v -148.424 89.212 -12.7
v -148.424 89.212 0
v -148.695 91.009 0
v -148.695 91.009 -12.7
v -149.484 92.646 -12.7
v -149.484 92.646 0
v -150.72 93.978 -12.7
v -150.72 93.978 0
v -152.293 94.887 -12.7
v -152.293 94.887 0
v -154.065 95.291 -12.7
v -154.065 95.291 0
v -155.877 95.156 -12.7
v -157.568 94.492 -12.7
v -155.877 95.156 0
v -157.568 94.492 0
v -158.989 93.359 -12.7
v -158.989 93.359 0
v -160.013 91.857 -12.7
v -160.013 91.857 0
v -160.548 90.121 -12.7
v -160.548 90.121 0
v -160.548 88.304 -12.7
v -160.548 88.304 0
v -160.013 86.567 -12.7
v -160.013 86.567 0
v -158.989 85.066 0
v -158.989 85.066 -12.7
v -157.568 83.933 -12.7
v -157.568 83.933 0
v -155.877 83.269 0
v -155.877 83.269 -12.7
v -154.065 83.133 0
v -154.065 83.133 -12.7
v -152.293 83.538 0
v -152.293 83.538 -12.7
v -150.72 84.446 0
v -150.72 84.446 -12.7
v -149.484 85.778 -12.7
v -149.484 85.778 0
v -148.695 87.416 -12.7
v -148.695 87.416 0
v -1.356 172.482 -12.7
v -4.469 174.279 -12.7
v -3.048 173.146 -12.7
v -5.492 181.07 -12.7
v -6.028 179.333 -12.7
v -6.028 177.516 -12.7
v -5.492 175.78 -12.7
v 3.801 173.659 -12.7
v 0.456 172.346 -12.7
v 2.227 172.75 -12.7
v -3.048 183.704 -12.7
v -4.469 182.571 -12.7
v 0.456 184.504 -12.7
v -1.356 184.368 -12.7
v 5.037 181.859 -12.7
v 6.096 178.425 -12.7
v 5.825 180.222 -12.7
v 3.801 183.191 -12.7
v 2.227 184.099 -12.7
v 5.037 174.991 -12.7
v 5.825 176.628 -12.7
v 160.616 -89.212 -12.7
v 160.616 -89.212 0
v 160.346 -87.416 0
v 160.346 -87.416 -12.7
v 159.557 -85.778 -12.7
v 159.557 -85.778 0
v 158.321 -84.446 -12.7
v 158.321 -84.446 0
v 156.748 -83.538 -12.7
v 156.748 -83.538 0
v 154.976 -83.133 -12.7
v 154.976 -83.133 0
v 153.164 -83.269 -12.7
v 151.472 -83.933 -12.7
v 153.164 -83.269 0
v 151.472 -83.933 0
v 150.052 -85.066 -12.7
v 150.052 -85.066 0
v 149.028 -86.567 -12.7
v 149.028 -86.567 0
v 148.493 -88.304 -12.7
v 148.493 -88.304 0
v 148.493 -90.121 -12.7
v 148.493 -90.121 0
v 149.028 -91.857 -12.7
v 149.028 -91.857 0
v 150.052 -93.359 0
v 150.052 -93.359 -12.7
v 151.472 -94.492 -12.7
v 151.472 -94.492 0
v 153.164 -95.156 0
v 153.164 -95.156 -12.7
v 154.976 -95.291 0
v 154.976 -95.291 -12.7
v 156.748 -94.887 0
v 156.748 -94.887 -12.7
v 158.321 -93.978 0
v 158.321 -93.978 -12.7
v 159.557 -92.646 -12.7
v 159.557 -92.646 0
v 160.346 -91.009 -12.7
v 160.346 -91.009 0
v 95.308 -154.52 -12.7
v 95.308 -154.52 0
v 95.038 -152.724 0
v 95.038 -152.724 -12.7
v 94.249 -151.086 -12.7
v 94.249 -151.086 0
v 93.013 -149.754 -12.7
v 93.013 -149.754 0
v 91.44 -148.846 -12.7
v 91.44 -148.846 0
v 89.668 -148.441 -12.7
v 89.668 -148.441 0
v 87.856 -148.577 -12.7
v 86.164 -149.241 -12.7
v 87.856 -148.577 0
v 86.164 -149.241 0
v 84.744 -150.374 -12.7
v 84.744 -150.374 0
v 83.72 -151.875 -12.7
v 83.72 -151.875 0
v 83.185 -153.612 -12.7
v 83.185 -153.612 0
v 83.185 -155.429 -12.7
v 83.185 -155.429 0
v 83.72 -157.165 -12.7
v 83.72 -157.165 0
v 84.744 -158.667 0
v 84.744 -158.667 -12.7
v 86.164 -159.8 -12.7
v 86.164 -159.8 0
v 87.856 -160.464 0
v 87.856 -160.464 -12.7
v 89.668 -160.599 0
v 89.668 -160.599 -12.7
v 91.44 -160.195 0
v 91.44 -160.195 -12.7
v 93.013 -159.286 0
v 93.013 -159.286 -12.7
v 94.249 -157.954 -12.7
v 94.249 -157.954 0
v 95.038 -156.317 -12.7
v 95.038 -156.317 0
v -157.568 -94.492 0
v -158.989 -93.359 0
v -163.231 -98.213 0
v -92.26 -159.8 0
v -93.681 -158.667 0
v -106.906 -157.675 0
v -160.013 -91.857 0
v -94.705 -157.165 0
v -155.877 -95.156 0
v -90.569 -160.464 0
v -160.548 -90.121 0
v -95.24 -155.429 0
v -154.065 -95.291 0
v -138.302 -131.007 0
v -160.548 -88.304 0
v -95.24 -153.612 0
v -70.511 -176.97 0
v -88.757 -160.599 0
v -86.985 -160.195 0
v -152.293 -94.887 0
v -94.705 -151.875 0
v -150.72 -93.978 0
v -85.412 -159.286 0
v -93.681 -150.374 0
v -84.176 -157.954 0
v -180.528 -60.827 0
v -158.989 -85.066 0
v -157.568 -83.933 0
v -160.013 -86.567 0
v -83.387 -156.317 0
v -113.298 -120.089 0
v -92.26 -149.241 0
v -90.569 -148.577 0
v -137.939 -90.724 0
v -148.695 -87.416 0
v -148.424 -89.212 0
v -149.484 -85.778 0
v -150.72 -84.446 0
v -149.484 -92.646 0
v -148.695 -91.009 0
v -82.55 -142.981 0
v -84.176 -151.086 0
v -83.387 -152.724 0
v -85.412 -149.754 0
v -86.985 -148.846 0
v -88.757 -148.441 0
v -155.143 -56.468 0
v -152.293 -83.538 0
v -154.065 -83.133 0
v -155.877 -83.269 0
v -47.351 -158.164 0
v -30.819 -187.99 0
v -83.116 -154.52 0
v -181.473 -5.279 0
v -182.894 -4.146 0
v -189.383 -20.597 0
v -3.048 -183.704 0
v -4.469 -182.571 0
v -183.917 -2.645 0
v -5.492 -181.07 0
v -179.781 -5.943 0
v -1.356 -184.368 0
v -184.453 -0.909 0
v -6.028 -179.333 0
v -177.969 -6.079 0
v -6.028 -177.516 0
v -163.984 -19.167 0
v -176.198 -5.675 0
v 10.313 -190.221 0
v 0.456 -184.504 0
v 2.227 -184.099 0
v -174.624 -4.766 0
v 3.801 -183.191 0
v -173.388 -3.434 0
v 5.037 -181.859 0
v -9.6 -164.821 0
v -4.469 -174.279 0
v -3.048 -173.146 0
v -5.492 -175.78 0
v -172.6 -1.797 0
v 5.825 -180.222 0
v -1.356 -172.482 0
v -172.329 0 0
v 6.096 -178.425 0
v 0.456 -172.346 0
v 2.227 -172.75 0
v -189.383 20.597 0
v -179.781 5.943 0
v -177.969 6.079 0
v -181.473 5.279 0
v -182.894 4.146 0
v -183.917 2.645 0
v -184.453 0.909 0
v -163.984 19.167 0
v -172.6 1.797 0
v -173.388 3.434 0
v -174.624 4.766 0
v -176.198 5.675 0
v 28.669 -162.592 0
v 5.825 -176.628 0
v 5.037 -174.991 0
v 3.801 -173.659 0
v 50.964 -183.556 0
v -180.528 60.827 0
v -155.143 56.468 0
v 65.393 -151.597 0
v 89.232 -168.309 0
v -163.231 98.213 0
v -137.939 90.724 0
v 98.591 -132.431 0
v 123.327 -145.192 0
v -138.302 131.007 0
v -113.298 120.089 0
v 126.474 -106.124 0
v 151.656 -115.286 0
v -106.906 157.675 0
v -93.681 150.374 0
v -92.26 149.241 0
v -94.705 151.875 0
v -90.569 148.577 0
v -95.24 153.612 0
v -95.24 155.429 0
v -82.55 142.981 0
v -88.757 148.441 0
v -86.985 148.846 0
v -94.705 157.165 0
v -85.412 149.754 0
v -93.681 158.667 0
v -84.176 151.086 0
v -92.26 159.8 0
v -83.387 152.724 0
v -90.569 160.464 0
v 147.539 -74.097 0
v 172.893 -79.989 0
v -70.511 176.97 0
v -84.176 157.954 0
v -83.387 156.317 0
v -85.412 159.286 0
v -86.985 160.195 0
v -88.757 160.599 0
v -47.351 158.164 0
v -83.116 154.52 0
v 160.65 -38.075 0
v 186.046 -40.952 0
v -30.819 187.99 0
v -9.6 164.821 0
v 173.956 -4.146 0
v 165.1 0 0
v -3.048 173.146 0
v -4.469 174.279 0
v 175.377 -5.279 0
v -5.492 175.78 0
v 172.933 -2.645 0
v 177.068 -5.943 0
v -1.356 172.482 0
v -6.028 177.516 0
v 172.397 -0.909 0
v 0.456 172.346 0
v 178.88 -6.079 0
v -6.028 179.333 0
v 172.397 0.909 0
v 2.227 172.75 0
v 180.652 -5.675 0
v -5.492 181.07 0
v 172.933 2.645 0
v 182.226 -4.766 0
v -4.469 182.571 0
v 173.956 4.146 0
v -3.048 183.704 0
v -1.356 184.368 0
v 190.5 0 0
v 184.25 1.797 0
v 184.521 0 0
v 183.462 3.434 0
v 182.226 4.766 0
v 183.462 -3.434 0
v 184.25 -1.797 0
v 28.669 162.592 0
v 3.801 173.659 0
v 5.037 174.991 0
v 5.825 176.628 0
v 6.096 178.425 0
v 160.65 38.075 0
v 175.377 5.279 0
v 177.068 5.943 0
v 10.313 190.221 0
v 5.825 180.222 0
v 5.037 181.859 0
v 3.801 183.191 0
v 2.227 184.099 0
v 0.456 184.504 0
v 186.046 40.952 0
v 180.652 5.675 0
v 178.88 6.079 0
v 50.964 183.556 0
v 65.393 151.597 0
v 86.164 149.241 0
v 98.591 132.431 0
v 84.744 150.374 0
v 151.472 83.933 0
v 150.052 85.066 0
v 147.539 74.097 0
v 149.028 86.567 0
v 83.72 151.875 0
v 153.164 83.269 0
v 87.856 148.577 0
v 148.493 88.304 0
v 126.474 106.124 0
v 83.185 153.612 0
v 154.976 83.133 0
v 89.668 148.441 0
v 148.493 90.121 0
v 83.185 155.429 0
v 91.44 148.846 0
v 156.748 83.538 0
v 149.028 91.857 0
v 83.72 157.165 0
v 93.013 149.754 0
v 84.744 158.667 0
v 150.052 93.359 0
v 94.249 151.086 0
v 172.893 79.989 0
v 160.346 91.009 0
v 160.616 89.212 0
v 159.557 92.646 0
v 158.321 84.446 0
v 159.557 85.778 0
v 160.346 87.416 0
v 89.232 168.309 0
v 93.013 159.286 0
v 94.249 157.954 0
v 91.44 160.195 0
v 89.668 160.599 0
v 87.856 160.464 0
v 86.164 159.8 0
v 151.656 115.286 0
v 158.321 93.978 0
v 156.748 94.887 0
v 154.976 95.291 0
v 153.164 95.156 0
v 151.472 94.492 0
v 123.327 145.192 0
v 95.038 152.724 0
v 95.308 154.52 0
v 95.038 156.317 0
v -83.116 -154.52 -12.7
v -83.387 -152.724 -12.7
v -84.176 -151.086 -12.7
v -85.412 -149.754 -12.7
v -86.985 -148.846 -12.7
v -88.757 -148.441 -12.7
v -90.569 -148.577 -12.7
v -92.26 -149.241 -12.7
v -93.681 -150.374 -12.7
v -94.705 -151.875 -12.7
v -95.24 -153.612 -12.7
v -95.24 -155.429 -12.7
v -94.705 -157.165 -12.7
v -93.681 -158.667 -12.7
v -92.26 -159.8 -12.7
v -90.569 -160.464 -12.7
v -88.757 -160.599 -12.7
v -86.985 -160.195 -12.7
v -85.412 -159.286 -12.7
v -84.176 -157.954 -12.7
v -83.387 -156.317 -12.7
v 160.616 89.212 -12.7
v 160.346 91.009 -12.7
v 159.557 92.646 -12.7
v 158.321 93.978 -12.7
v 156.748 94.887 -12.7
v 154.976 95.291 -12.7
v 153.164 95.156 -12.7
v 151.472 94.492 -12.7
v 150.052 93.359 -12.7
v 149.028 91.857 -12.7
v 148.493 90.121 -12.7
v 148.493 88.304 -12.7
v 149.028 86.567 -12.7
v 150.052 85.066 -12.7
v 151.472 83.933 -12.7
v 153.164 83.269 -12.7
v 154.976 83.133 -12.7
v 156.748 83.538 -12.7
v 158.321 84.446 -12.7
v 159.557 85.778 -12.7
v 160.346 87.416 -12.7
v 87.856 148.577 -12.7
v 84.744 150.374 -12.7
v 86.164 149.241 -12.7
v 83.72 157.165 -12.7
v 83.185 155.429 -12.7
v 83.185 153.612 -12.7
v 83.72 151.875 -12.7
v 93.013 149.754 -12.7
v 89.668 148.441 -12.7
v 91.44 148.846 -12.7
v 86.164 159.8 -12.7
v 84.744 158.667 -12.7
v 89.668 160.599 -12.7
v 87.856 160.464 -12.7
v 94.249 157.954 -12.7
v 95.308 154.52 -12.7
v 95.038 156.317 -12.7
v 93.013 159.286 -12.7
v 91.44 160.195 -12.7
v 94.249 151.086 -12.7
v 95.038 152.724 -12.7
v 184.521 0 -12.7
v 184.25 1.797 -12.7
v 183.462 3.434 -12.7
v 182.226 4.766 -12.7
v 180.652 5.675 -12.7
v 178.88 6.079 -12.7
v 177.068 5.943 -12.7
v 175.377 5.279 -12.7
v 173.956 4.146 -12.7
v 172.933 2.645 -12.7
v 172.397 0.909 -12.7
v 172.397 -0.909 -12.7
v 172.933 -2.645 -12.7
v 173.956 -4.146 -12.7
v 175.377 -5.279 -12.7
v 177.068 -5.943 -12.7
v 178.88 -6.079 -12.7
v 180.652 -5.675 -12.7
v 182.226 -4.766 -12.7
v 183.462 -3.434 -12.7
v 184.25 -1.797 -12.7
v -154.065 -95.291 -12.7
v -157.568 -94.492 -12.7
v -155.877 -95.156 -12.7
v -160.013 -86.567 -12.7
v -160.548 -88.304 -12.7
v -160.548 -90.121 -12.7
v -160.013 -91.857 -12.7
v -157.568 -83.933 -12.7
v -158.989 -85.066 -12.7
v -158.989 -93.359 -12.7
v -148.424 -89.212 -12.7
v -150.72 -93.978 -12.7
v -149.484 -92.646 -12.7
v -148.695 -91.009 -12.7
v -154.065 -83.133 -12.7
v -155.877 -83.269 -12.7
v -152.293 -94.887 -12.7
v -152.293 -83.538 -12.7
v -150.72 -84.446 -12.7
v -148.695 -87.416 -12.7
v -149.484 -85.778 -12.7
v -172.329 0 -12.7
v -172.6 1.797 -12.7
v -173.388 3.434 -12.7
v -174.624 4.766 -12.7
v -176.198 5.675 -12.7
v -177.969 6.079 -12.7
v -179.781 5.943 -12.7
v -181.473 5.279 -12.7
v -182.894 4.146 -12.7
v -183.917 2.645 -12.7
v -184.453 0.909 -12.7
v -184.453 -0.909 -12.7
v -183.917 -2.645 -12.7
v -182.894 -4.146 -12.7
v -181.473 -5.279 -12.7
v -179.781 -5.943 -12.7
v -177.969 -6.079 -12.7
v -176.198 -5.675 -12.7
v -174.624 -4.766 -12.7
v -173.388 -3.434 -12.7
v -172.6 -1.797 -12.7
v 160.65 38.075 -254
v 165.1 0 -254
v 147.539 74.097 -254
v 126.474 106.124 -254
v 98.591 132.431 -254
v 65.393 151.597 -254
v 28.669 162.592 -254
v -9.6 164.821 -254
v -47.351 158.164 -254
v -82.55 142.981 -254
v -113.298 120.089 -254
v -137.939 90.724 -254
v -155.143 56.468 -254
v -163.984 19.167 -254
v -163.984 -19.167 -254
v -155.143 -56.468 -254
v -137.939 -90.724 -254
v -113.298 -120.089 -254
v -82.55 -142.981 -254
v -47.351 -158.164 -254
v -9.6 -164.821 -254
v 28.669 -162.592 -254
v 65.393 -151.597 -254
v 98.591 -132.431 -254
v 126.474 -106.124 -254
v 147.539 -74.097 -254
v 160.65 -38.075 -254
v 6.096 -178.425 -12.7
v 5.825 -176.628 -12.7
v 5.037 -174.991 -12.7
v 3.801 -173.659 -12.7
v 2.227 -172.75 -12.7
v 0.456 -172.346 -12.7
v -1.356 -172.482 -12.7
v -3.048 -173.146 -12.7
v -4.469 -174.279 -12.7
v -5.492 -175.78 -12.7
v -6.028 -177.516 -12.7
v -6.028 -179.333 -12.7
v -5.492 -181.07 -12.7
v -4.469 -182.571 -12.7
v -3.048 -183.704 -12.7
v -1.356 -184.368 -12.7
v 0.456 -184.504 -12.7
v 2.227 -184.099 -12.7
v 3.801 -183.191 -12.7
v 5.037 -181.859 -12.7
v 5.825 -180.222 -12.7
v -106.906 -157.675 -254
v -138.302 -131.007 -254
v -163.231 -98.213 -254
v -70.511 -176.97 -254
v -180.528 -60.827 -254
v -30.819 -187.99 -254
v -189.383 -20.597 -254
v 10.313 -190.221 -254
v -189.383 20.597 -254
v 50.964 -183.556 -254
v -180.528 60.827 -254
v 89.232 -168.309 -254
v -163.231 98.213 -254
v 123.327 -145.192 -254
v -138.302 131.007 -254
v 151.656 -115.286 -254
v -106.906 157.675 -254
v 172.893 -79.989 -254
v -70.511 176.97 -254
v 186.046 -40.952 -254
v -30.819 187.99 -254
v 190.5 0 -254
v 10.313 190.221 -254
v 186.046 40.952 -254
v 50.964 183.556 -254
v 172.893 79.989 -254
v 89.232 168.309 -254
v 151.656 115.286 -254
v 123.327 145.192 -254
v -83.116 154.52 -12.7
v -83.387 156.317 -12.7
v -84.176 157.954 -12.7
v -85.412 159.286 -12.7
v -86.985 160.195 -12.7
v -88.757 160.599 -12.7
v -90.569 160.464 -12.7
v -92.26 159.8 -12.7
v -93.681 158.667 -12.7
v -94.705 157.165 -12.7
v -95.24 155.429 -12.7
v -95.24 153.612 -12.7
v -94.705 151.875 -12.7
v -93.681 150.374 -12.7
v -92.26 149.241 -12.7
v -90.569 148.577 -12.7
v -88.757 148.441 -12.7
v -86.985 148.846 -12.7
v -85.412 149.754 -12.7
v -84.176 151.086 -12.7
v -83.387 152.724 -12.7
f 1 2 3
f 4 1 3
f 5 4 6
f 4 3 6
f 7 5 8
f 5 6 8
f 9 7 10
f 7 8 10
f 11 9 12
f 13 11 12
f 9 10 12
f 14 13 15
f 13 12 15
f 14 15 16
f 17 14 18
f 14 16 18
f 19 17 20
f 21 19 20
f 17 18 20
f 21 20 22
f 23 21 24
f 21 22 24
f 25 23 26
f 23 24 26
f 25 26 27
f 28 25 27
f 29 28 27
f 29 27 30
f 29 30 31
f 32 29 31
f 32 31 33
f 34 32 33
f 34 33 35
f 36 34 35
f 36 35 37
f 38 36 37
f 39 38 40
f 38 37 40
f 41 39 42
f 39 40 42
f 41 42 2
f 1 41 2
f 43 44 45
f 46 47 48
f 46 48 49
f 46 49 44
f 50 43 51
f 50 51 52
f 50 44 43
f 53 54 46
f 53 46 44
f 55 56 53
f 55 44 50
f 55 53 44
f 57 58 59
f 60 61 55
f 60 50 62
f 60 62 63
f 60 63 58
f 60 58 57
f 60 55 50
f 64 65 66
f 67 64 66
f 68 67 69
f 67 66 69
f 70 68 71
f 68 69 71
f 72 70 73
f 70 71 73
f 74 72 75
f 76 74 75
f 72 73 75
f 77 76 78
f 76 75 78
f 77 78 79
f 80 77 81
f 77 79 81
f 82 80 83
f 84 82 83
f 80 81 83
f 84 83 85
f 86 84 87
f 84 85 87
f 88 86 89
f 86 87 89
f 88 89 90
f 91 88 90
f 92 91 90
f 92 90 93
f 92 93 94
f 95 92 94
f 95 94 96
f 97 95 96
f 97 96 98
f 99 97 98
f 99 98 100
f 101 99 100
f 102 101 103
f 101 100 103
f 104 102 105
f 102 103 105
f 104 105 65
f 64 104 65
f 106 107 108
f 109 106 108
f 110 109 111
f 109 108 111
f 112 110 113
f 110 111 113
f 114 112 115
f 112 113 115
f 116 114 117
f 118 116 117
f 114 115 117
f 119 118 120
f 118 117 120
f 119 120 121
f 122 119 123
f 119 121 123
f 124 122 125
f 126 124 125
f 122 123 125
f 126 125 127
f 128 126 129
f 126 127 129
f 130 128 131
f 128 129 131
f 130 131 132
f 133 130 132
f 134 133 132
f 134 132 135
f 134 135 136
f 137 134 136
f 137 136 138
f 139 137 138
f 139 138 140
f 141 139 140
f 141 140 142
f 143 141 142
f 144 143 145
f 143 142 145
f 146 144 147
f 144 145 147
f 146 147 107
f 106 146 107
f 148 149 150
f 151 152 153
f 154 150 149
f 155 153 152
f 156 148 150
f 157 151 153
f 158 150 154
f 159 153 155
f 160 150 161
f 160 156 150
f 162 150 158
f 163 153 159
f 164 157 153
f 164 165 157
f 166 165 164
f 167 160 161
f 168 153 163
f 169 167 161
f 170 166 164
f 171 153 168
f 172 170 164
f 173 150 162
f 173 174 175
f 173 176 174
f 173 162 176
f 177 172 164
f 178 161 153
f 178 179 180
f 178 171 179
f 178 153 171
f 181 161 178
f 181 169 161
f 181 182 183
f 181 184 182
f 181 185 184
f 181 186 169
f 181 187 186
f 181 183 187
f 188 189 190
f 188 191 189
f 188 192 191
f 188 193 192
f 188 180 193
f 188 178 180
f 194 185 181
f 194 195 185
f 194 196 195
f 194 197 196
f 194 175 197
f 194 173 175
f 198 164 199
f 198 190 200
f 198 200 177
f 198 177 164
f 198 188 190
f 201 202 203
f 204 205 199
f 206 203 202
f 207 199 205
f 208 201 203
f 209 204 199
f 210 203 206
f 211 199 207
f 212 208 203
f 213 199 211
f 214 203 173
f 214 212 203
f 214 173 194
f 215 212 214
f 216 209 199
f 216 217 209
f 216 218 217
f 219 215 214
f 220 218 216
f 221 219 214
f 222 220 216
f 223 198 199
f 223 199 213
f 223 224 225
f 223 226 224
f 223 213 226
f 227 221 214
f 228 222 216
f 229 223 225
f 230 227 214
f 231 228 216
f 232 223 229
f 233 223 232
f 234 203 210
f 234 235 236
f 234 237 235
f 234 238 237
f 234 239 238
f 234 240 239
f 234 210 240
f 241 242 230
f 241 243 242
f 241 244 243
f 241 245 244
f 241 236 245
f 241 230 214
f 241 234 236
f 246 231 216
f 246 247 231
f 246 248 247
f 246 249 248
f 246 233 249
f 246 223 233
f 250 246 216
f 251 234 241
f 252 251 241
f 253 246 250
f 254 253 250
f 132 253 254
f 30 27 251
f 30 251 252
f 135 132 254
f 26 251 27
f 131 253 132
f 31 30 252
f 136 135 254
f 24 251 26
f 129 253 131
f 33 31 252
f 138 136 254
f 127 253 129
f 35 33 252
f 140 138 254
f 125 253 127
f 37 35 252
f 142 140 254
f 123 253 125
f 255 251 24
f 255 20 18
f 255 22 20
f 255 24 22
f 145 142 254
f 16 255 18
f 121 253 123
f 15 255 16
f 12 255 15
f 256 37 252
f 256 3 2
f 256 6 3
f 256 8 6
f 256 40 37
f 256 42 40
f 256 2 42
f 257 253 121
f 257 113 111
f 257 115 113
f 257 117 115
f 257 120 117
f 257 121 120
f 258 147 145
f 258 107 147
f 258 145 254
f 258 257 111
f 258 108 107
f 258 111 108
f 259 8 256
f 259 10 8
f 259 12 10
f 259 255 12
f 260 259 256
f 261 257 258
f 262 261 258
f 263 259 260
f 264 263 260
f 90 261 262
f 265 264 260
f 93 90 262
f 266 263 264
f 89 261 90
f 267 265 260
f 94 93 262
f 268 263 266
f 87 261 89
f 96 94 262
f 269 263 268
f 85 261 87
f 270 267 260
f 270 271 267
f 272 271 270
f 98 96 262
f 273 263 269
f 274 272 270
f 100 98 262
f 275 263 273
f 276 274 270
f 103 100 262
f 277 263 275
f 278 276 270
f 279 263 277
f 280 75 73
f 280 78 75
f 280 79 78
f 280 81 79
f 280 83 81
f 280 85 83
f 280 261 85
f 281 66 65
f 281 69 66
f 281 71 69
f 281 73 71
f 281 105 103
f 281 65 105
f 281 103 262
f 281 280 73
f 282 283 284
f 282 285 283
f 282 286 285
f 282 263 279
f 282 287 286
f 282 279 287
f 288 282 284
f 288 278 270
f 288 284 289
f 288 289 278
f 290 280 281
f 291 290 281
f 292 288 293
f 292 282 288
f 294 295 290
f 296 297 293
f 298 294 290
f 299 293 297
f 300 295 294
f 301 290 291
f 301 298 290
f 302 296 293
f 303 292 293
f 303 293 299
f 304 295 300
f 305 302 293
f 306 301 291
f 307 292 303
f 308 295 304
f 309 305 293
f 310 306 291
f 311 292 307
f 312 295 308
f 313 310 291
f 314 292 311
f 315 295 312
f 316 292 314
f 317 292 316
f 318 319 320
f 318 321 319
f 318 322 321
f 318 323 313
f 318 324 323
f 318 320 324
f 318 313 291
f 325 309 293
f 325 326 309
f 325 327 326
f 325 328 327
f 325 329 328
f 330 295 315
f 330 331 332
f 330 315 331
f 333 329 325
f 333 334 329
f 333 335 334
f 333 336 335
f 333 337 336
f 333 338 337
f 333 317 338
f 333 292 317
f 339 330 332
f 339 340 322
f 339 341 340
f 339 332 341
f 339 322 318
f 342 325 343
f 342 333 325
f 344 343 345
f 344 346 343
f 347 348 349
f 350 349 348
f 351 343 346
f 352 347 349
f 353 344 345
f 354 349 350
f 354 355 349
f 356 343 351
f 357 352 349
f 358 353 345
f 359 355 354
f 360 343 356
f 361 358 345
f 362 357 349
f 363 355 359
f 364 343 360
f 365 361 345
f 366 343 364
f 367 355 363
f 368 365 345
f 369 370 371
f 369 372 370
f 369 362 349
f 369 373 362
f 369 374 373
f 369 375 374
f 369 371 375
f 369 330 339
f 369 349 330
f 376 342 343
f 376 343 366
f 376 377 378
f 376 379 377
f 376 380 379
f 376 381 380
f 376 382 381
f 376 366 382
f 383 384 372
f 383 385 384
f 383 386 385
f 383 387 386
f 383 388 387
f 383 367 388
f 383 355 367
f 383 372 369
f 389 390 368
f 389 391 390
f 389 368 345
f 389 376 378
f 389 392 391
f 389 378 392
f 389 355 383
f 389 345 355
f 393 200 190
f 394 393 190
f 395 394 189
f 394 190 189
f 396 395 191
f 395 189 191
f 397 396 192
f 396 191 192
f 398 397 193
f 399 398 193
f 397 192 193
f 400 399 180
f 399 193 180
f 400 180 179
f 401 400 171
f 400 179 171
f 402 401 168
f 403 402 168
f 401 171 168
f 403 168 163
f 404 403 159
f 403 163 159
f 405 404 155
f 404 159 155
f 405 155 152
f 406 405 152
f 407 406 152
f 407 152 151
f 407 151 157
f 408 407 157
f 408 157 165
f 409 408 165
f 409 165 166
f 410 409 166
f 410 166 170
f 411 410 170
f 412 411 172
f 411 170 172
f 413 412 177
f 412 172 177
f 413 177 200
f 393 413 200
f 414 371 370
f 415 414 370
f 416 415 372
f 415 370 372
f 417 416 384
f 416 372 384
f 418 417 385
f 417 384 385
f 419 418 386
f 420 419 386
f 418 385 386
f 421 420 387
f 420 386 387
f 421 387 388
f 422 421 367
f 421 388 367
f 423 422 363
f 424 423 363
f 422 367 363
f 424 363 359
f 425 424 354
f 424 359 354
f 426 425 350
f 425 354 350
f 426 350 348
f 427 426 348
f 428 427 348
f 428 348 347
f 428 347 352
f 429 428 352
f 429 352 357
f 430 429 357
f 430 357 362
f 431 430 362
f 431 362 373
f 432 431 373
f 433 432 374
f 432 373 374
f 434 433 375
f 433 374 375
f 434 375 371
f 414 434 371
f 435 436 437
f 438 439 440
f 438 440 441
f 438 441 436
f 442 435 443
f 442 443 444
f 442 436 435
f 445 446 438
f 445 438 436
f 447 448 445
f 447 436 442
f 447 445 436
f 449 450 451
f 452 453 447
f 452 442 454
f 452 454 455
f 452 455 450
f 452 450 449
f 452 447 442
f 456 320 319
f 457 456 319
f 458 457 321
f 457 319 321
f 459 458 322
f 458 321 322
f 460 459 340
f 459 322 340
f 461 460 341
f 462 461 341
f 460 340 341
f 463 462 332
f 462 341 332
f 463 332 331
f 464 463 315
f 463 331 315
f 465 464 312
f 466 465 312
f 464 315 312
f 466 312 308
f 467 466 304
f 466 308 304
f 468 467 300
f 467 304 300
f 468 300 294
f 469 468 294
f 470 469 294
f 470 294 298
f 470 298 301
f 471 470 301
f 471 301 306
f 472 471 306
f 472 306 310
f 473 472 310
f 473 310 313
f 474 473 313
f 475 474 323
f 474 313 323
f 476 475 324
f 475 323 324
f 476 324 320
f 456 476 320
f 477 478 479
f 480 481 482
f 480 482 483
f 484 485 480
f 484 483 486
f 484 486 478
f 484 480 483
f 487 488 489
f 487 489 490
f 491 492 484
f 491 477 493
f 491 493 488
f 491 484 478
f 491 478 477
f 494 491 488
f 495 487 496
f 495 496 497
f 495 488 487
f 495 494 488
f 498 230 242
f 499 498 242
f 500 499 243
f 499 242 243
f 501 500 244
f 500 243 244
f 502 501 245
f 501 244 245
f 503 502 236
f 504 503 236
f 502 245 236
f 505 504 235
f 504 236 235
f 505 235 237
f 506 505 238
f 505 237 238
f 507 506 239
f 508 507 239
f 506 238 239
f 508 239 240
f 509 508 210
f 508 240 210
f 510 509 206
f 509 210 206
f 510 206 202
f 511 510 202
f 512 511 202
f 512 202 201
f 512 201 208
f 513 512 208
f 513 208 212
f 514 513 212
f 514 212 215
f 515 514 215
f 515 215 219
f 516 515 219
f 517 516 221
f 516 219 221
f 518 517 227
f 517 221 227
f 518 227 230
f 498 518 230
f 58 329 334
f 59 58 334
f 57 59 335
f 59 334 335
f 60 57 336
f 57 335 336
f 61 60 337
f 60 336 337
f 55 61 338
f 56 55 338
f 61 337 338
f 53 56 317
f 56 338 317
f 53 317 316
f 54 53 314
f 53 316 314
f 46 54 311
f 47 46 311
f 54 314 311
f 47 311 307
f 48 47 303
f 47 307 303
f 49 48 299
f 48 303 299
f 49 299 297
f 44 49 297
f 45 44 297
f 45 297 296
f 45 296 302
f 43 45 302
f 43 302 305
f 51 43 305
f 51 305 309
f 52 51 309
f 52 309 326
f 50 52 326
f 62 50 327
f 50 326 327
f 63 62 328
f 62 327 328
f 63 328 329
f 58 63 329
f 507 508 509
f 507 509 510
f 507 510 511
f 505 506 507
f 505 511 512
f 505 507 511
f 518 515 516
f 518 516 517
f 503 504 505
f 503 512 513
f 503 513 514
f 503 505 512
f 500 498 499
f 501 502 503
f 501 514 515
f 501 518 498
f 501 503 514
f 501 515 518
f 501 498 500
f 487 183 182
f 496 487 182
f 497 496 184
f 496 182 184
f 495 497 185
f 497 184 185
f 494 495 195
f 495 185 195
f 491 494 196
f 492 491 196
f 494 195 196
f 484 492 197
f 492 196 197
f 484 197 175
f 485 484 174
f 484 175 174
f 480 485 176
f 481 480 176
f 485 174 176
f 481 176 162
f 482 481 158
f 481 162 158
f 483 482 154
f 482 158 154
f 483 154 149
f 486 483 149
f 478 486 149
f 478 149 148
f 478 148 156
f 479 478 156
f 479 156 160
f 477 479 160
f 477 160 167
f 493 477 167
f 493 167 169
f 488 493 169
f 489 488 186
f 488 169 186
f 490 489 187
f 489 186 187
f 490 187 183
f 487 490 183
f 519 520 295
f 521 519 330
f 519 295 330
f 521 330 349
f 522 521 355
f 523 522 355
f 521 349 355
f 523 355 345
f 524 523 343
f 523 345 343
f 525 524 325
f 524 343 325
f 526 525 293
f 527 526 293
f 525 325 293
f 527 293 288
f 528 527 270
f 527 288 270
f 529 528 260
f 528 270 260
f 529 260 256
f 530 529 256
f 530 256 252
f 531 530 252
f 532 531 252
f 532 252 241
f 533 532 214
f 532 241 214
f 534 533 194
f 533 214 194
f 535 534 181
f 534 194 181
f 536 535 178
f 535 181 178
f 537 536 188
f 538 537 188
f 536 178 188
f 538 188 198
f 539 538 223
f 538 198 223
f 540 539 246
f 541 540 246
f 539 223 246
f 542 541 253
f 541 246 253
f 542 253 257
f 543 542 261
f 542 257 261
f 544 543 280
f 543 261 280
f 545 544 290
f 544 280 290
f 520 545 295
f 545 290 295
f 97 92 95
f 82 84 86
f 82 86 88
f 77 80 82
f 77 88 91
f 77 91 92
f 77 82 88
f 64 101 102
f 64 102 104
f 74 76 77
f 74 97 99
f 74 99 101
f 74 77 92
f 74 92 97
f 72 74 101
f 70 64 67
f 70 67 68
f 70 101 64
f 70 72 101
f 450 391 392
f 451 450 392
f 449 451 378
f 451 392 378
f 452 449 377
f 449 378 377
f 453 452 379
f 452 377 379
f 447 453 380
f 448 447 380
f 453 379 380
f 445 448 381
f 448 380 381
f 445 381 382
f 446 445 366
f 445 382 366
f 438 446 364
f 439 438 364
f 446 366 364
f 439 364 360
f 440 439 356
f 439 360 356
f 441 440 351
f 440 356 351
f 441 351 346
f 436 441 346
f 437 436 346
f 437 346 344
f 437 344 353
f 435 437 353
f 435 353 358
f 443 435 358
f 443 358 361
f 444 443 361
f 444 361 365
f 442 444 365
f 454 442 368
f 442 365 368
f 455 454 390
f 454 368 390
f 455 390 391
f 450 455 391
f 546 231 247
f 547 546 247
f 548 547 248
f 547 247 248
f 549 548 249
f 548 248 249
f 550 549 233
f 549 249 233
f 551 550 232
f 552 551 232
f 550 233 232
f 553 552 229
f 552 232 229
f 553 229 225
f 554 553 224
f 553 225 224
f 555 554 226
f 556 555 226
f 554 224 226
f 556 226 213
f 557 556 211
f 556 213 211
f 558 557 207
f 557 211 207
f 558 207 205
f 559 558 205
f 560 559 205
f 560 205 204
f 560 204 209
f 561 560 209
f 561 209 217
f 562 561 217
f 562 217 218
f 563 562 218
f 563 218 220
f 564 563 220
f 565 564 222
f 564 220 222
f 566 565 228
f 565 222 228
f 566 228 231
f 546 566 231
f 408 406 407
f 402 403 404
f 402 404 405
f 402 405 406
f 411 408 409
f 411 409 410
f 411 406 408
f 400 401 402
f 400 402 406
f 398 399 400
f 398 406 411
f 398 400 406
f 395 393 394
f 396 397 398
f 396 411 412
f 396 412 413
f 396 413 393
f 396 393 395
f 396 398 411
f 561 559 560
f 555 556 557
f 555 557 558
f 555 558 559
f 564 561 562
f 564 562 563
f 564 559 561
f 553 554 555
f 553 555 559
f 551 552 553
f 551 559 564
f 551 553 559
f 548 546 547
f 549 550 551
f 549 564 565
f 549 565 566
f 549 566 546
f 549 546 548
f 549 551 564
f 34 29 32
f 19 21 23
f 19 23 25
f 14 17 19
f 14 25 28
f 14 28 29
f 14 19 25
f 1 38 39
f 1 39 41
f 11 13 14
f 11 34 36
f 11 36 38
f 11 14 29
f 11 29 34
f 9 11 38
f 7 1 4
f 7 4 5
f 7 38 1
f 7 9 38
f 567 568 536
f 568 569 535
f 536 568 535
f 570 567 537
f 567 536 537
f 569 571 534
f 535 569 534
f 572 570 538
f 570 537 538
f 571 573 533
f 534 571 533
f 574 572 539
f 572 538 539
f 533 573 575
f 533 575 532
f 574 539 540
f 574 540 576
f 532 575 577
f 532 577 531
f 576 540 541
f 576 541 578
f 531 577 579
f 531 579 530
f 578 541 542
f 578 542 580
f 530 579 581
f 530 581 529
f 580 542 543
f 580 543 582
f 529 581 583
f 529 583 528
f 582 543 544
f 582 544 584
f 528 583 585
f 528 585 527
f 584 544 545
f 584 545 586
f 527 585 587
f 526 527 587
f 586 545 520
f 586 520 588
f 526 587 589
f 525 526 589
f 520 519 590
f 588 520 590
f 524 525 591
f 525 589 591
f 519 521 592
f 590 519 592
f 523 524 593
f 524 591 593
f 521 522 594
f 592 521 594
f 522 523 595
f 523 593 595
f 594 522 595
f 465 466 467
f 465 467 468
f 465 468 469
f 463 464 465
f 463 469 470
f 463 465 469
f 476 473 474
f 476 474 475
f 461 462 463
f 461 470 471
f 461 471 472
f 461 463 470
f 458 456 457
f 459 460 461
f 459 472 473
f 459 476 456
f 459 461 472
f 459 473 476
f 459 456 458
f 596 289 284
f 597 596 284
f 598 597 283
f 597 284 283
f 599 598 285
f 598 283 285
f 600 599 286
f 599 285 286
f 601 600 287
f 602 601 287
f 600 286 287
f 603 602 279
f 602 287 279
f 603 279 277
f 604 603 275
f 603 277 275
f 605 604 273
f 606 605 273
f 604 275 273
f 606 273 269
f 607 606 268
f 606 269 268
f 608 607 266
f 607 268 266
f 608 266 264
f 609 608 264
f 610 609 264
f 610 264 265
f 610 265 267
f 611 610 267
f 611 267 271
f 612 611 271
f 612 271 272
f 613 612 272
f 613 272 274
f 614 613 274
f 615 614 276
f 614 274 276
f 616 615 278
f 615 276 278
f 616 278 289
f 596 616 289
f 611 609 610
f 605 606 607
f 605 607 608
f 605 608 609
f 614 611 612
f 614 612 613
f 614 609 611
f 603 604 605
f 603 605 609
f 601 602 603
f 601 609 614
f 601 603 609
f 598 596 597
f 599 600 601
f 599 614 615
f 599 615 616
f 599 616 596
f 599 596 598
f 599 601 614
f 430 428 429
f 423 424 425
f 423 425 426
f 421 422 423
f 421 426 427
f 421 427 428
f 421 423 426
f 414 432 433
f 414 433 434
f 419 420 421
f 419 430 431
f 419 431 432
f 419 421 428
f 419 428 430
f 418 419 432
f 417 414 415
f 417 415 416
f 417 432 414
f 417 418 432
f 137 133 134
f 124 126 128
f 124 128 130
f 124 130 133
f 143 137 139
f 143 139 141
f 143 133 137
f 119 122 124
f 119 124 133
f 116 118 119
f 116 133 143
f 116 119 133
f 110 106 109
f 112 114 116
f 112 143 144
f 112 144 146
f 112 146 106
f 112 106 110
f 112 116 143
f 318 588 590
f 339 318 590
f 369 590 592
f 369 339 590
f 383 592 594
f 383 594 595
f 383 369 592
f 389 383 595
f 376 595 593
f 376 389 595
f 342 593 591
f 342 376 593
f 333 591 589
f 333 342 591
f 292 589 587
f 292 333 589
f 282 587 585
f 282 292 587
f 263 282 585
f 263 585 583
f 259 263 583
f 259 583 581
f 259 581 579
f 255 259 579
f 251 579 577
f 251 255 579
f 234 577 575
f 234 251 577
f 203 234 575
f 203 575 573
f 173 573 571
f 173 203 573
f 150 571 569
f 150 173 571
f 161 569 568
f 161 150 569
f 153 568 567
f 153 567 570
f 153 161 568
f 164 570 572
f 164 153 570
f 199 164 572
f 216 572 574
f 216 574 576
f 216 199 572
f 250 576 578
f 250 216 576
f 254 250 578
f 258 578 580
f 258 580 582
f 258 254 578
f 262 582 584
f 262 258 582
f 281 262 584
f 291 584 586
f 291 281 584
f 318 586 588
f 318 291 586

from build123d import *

# Parameters (mm, degrees)
F0_R     = 190.5
F0_R_2   = 165.1
F1_DEPTH = 254
F2_R     = 6.096
F3_DEPTH = 12.7


with BuildPart() as f1:
    # F0 (on Top) → F1 (new body)
    with BuildSketch(Plane.XY):
        Circle(F0_R)
        Circle(F0_R_2, mode=Mode.SUBTRACT)
    extrude(amount=-F1_DEPTH)

    # F2 (on Top) → F3 (cut)
    with BuildSketch(Plane.XY):
        with Locations((0, 178.42484)):
            Circle(F2_R)
        with Locations((-89.21242, 154.5204441062)):
            Circle(F2_R)
        with Locations((-154.5204441062, 89.21242)):
            Circle(F2_R)
        with Locations((-178.42484, 0)):
            Circle(F2_R)
        with Locations((-154.5204441062, -89.21242)):
            Circle(F2_R)
        with Locations((-89.21242, -154.5204441062)):
            Circle(F2_R)
        with Locations((0, -178.42484)):
            Circle(F2_R)
        with Locations((89.21242, -154.5204441062)):
            Circle(F2_R)
        with Locations((154.5204441062, -89.21242)):
            Circle(F2_R)
        with Locations((178.42484, 0)):
            Circle(F2_R)
        with Locations((154.5204441062, 89.21242)):
            Circle(F2_R)
        with Locations((89.21242, 154.5204441062)):
            Circle(F2_R)
    extrude(amount=-F3_DEPTH, mode=Mode.SUBTRACT)


solid = f1.part
